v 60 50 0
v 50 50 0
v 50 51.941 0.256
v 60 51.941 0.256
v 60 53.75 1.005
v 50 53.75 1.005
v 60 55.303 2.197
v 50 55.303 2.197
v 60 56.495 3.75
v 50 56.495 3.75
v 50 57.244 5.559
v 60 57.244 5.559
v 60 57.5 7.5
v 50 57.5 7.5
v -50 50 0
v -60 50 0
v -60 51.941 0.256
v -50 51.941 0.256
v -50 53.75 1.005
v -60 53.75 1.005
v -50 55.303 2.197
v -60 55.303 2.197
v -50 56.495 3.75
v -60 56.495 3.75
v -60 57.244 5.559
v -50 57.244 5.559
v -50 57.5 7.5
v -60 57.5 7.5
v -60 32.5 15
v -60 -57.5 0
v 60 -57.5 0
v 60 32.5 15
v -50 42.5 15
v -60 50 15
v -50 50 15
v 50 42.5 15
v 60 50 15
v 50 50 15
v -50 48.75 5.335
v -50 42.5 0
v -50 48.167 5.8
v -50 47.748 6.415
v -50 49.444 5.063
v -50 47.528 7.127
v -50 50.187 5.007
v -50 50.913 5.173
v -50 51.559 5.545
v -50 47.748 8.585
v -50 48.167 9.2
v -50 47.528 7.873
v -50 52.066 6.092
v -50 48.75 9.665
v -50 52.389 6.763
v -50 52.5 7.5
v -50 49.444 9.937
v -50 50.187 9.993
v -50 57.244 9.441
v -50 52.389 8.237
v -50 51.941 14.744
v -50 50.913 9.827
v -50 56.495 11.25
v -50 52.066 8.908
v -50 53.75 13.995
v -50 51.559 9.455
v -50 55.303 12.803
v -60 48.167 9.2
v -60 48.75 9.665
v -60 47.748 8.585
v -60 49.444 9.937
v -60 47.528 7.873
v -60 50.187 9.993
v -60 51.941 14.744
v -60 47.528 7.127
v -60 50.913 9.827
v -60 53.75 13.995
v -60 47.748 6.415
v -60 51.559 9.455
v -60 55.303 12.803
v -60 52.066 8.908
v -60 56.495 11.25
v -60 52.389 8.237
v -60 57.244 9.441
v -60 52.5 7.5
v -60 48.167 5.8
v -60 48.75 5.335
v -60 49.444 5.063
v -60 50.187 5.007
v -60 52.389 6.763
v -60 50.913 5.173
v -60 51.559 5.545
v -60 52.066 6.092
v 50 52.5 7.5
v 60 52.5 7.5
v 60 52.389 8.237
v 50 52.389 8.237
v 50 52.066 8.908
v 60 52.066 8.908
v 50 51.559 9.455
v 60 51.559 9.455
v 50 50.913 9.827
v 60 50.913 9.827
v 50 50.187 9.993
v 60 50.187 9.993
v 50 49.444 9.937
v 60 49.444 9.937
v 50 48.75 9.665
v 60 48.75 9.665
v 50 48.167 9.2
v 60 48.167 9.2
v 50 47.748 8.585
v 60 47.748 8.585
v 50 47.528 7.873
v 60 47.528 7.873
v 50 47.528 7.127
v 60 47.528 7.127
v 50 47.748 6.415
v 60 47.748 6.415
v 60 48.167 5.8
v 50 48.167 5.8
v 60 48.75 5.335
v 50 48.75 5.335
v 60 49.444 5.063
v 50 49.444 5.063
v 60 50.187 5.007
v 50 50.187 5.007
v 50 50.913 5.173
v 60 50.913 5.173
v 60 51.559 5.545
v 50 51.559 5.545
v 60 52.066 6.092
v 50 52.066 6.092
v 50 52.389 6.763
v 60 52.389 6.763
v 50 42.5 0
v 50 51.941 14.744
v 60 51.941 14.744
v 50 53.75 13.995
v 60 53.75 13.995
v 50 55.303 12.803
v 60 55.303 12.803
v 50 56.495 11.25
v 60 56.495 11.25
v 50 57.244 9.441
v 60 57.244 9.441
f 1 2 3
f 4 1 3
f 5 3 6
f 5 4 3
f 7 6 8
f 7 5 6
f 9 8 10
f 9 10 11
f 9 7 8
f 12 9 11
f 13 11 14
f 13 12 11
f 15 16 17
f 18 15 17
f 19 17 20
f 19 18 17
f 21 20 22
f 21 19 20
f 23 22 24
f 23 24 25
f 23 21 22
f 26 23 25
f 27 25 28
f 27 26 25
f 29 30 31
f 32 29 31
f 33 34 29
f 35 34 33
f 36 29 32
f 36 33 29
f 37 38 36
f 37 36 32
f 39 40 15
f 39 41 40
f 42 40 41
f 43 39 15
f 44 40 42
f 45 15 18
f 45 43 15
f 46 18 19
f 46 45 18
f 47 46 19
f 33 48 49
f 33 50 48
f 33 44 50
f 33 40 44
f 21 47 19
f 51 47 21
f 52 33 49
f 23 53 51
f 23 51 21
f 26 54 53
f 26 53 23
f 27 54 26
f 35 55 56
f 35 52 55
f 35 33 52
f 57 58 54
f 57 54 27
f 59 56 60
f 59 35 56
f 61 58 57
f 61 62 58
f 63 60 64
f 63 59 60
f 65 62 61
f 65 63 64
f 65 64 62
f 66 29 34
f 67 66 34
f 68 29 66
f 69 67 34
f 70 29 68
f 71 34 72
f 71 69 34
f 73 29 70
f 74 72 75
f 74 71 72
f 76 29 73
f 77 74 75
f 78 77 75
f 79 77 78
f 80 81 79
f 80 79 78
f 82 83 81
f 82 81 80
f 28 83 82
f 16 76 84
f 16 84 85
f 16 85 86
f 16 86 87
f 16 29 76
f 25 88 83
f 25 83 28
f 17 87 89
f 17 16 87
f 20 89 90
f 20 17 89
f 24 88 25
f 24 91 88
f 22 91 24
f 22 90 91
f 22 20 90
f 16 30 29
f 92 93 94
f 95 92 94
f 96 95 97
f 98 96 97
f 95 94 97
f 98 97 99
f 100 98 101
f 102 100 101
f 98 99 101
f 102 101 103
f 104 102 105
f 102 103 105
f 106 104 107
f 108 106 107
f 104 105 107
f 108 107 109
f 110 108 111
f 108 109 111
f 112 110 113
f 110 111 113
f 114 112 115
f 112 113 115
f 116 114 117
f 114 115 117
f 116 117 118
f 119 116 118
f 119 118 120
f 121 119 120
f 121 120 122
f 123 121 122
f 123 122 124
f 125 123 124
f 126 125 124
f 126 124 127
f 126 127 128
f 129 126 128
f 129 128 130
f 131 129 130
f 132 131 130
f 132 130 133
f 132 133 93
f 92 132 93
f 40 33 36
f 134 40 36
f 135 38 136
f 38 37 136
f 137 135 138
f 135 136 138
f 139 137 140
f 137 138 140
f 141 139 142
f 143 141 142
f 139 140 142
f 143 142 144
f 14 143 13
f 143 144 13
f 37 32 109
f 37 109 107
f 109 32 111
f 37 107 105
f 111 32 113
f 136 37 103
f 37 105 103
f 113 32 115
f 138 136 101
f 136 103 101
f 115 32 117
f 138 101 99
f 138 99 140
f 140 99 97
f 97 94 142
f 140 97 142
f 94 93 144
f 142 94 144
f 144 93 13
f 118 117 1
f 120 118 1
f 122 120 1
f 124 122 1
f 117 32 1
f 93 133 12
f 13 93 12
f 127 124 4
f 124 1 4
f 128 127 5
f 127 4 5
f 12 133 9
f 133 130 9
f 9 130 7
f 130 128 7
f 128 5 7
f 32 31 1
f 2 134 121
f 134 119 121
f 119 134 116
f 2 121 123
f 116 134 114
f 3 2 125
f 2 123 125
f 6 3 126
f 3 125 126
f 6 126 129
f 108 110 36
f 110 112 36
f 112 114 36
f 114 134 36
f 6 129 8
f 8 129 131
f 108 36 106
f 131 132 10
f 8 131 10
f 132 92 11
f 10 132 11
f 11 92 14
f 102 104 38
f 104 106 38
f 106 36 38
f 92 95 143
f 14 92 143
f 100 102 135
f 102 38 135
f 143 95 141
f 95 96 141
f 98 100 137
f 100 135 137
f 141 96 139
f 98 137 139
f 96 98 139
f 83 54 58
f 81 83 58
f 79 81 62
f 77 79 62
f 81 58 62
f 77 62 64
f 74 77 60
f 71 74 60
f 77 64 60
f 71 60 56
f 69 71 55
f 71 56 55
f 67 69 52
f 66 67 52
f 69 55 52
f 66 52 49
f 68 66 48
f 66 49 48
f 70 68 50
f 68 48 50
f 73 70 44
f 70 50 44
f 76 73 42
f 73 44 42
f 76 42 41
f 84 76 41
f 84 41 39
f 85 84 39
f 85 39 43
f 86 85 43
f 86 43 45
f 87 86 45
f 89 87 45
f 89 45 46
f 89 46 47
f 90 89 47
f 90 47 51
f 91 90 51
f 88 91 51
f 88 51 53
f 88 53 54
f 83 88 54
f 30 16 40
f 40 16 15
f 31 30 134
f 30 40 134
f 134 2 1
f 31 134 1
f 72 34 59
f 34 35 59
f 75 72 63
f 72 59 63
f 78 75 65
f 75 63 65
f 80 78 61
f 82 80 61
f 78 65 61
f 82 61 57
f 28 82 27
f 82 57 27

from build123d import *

# Parameters (mm, degrees)
F0_W     = 120
F0_H     = 115
F1_DEPTH = 15
F2_W     = 100
F2_H     = 15
F3_DEPTH = 15.001
F4_R     = 2.5
F5_DEPTH = 120.001
F6_SIZE2 = 14.99999
F6_SIZE  = 89.99999
F7_R     = 7.49999


# Not quite as in the source:
# - a fillet or chamfer is up to 0.001 mm smaller than in the source, because OpenCascade refuses the exact size


with BuildPart() as f1:
    # F0 (on Top) → F1 (new body)
    with BuildSketch(Plane.XY):
        Rectangle(F0_W, F0_H)
    extrude(amount=F1_DEPTH)

    # F2 (on face) → F3 (cut, through all)
    with BuildSketch(Plane.XY.offset(15)):
        with Locations((0, 50)):
            Rectangle(F2_W, F2_H)
    extrude(amount=-F3_DEPTH, mode=Mode.SUBTRACT)

    # F4 (on face) → F5 (cut, through all)
    with BuildSketch(Plane.YZ.offset(60)):
        with Locations((50, 7.5)):
            Circle(F4_R)
    extrude(amount=-F5_DEPTH, mode=Mode.SUBTRACT)

    # F6 (size 90 and 15 in the source; OpenCascade refuses exactly that, so slightly less here)
    f6_edges = [f1.edges().sort_by_distance(p)[0] for p in [
        (0, -57.5, 15),
    ]]
    f6_side = f1.faces().sort_by_distance((0, -6.097561, 15))[0]
    chamfer(f6_edges, length=F6_SIZE, length2=F6_SIZE2, reference=f6_side)

    # F7 (radius 7.5 in the source; OpenCascade refuses exactly that, so slightly less here)
    f7_edges = [f1.edges().sort_by_distance(p)[0] for p in [
        (55, 57.5, 15),
        (55, 57.5, 0),
        (-55, 57.5, 0),
        (-55, 57.5, 15),
    ]]
    fillet(f7_edges, radius=F7_R)


solid = f1.part
